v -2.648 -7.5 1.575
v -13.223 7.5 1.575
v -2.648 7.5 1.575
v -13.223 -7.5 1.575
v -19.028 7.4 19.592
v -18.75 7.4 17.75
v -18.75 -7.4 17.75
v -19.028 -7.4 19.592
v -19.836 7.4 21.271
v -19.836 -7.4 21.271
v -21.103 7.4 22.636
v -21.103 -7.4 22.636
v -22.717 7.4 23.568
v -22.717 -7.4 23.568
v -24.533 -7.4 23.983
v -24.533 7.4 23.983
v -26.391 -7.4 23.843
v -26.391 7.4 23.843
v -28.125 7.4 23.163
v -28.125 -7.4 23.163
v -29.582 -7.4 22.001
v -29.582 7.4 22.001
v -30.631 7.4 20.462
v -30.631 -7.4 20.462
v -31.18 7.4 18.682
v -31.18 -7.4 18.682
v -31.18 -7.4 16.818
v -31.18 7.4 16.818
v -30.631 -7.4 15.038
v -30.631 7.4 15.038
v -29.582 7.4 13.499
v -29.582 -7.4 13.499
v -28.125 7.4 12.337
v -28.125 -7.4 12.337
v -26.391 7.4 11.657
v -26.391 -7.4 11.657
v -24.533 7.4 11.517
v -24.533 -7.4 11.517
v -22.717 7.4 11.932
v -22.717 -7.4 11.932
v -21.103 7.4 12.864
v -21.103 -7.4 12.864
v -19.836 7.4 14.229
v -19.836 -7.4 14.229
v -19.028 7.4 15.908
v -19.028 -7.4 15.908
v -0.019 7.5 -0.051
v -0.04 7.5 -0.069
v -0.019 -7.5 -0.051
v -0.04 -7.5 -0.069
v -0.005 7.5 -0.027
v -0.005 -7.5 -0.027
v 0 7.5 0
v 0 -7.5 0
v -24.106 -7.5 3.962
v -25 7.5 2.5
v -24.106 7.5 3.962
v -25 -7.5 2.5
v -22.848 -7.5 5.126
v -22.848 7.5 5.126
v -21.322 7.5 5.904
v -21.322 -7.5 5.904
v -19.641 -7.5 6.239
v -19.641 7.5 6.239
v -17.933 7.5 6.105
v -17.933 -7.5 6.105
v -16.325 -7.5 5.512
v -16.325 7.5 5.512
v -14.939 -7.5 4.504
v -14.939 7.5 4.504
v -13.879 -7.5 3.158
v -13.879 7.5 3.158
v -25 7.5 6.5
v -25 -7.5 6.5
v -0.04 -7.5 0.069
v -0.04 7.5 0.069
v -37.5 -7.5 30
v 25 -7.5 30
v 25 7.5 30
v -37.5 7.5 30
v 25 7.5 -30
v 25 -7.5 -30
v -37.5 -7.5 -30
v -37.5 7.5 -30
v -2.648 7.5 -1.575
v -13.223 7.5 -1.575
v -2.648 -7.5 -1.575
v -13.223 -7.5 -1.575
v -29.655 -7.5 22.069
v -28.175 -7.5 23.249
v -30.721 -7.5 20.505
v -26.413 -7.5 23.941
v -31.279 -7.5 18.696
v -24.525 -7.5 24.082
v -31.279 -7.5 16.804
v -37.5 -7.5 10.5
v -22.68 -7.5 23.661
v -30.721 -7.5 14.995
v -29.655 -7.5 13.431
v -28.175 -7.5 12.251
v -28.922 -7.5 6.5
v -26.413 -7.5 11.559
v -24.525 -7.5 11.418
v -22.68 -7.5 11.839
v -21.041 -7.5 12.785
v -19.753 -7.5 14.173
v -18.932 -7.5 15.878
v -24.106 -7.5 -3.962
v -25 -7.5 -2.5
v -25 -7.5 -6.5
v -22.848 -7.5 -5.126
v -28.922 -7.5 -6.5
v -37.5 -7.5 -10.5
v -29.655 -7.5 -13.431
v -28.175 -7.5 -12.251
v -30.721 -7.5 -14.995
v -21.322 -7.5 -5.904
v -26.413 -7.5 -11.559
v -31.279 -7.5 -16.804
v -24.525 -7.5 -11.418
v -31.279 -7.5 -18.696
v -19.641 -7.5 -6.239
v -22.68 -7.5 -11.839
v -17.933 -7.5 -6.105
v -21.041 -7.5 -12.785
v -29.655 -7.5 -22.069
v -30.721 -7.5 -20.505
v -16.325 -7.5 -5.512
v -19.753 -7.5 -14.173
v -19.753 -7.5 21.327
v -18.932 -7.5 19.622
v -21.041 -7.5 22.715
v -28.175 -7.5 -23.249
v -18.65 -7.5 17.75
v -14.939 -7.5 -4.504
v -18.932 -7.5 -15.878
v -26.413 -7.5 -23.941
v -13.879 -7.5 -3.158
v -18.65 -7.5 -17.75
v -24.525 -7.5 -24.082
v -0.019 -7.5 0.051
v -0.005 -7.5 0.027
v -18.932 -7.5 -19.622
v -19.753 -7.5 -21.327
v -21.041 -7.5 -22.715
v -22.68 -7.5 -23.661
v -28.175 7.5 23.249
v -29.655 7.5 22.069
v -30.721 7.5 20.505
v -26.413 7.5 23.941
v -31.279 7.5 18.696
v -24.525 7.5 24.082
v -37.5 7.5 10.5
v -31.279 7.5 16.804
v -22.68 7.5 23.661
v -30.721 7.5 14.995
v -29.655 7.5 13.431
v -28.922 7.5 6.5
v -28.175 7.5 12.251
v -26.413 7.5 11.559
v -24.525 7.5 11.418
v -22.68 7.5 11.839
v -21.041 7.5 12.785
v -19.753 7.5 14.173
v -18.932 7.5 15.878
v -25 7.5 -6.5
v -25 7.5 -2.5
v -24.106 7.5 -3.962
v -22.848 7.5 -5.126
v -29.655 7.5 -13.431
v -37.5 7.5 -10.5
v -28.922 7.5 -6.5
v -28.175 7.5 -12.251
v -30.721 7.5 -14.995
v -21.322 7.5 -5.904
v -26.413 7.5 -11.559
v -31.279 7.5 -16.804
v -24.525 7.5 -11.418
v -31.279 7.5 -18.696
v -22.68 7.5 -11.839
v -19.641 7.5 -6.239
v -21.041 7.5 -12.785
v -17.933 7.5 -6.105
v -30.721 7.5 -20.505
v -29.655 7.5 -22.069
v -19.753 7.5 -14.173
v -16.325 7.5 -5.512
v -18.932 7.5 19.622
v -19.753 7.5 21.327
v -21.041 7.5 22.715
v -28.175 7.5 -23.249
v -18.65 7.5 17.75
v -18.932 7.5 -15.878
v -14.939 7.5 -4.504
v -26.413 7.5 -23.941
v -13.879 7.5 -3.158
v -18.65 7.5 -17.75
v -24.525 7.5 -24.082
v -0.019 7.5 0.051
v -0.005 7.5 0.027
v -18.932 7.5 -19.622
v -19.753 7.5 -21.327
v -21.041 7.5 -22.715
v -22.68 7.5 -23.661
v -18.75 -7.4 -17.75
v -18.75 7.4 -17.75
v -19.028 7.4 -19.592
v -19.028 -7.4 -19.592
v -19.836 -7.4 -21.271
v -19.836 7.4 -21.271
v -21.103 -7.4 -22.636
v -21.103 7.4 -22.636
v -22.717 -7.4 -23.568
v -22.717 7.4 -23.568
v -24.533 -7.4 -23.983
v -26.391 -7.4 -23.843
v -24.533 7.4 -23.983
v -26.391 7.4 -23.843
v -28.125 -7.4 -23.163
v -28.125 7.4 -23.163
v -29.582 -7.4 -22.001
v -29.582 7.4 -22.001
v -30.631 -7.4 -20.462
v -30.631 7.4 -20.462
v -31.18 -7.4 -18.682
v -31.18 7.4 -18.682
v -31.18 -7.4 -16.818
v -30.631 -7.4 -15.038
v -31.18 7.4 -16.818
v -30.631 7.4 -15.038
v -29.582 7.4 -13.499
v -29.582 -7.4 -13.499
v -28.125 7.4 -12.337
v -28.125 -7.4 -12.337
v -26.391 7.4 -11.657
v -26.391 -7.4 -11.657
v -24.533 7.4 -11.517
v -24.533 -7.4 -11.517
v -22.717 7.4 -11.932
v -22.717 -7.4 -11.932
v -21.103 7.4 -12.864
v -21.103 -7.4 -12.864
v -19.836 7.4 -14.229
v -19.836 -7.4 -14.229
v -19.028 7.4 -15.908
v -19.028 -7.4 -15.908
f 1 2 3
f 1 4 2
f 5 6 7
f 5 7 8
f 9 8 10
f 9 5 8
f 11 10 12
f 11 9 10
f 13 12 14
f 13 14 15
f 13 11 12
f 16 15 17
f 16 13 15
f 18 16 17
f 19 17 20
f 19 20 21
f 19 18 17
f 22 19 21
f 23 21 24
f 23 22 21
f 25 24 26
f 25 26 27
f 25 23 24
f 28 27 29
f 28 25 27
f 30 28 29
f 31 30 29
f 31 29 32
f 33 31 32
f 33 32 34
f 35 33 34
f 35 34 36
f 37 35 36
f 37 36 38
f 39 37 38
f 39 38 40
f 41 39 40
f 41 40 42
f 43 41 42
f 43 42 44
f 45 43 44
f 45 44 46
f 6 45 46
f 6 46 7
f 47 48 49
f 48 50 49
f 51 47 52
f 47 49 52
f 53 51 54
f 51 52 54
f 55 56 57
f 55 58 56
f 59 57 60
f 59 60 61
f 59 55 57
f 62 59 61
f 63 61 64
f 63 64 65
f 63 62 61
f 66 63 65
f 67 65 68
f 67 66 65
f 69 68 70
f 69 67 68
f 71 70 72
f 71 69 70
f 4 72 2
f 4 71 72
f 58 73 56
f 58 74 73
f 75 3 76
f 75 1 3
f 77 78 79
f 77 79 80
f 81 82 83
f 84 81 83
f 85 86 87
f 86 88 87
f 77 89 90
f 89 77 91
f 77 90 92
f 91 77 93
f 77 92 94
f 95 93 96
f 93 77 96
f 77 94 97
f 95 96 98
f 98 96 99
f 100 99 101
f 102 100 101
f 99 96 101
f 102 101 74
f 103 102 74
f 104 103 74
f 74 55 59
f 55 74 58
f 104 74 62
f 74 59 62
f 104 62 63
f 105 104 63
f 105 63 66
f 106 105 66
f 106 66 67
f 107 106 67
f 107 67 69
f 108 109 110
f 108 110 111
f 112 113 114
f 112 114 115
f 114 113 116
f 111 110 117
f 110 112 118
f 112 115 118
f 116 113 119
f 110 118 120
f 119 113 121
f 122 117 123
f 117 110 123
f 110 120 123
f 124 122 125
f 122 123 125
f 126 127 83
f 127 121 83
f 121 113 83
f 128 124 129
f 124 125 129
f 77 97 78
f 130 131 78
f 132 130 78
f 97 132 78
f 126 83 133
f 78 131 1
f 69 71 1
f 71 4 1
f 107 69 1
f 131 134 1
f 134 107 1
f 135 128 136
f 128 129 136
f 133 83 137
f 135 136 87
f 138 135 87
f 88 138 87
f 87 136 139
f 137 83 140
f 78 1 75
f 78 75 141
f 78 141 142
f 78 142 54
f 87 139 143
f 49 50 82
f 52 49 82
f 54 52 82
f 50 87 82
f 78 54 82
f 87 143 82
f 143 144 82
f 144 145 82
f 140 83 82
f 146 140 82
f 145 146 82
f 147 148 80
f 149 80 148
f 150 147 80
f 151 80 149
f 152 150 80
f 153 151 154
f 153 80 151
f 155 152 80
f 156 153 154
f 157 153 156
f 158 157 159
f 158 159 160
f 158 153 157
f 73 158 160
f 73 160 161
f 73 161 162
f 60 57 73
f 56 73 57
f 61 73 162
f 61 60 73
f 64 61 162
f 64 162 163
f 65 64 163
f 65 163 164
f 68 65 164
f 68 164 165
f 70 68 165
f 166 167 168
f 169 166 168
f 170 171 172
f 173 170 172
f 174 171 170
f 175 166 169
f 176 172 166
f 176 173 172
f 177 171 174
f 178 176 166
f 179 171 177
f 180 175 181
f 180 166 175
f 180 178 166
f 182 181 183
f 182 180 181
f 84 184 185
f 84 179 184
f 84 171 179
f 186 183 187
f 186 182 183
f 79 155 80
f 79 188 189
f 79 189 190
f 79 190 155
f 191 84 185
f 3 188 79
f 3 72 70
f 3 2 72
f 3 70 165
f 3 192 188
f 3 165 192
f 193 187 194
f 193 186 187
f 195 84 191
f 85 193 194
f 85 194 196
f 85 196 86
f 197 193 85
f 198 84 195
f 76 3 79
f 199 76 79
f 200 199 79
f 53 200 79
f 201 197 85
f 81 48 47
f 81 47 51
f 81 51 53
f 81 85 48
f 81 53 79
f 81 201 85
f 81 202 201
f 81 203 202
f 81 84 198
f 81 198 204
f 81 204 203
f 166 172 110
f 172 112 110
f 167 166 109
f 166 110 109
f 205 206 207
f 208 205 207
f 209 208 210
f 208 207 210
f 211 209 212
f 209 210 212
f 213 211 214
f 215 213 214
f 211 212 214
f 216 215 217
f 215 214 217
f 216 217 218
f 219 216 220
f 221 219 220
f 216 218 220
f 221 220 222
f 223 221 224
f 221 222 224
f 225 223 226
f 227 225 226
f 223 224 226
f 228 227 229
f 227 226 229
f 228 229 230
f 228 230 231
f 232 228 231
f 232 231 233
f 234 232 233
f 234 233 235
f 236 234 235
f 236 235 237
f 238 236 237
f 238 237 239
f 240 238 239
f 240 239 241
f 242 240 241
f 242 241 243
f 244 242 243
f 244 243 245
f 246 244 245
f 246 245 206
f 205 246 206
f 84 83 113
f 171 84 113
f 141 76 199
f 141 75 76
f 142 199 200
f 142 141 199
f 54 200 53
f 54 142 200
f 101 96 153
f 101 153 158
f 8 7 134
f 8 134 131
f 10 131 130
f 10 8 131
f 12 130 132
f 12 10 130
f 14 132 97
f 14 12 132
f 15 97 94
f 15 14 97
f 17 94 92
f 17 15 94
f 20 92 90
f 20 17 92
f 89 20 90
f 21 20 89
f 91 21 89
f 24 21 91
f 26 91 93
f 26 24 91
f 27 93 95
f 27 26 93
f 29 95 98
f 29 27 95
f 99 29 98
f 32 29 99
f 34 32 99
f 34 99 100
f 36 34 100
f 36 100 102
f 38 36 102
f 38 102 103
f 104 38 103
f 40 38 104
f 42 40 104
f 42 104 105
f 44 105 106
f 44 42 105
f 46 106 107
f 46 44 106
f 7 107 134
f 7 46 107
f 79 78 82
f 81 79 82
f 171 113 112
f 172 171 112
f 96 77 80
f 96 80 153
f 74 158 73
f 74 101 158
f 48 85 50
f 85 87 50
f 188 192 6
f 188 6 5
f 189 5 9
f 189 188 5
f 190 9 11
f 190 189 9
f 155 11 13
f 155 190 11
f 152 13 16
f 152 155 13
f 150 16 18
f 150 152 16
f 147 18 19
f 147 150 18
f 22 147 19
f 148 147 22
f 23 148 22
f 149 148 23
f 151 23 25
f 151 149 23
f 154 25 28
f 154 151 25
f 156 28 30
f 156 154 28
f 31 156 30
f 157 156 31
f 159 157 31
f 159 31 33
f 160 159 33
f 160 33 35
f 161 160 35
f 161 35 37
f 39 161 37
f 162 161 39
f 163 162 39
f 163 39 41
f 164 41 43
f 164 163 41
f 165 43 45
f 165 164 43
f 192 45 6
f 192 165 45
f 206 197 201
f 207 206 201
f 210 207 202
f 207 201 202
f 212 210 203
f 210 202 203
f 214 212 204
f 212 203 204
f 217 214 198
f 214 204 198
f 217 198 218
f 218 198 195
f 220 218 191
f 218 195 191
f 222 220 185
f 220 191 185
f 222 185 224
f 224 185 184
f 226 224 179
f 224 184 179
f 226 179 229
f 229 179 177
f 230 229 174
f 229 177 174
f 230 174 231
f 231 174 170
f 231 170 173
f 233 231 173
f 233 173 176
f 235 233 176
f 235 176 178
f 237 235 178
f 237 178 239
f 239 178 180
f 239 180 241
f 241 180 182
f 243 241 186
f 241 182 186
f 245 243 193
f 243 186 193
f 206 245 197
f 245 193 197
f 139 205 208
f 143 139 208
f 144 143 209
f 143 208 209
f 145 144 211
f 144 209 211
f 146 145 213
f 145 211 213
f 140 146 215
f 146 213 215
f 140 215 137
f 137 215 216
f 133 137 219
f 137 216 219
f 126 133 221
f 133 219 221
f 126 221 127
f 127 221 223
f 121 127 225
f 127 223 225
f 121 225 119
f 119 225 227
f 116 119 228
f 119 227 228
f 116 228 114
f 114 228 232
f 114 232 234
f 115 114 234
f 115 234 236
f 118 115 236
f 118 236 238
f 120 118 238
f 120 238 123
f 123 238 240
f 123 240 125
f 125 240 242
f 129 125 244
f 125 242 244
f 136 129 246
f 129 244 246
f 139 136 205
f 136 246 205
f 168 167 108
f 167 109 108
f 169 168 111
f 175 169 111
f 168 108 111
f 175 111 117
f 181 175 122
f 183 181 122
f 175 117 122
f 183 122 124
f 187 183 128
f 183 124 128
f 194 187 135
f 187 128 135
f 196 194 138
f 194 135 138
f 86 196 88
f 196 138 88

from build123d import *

# Parameters (mm, degrees)
F0_R     = 6.25
F1_DEPTH = 7.5
F3_SIZE  = 0.1


with BuildPart() as f1:
    # F0 (on Front) → F1 (new body, symmetric)
    with BuildSketch(Plane.XZ):
        with BuildLine():
            ThreePointArc((-0.04, 0.0692820323), (-0.0107179677, 0.04), (0, 0))
            Line((0, 0), (14.3022312224, 0))
            Line((14.3022312224, 0), (25, 0))
            Line((25, 0), (25, 30))
            Line((25, 30), (-37.5, 30))
            Line((-37.5, 30), (-37.5, 10.5))
            Line((-37.5, 10.5), (-28.921972318, 6.5))
            Line((-28.921972318, 6.5), (-25, 6.5))
            Line((-25, 6.5), (-25, 2.5))
            ThreePointArc((-25, 2.5), (-18.7823742649, 6.2308090689), (-13.2234851669, 1.575))
            Line((-13.2234851669, 1.575), (-2.6479800219, 1.575))
            Line((-2.6479800219, 1.575), (-0.04, 0.0692820323))
        make_face()
        with Locations((-25, 17.75)):
            Circle(F0_R, mode=Mode.SUBTRACT)
    extrude(amount=F1_DEPTH, both=True)

    # F2: F1 across face


with BuildPart() as f1_1:
    add(f1.part)
    add(f1.part.mirror(Plane(origin=(12.5, 0, 0), x_dir=(1, 0, 0), z_dir=(0, 0, -1))))

    # F3
    f3_edges = [f1_1.edges().sort_by_distance(p)[0] for p in [
        (-31.25, -7.5, 17.75),
        (-31.25, -7.5, -17.75),
        (-31.25, 7.5, 17.75),
        (-31.25, 7.5, -17.75),
    ]]
    chamfer(f3_edges, length=F3_SIZE)


solid = f1_1.part
